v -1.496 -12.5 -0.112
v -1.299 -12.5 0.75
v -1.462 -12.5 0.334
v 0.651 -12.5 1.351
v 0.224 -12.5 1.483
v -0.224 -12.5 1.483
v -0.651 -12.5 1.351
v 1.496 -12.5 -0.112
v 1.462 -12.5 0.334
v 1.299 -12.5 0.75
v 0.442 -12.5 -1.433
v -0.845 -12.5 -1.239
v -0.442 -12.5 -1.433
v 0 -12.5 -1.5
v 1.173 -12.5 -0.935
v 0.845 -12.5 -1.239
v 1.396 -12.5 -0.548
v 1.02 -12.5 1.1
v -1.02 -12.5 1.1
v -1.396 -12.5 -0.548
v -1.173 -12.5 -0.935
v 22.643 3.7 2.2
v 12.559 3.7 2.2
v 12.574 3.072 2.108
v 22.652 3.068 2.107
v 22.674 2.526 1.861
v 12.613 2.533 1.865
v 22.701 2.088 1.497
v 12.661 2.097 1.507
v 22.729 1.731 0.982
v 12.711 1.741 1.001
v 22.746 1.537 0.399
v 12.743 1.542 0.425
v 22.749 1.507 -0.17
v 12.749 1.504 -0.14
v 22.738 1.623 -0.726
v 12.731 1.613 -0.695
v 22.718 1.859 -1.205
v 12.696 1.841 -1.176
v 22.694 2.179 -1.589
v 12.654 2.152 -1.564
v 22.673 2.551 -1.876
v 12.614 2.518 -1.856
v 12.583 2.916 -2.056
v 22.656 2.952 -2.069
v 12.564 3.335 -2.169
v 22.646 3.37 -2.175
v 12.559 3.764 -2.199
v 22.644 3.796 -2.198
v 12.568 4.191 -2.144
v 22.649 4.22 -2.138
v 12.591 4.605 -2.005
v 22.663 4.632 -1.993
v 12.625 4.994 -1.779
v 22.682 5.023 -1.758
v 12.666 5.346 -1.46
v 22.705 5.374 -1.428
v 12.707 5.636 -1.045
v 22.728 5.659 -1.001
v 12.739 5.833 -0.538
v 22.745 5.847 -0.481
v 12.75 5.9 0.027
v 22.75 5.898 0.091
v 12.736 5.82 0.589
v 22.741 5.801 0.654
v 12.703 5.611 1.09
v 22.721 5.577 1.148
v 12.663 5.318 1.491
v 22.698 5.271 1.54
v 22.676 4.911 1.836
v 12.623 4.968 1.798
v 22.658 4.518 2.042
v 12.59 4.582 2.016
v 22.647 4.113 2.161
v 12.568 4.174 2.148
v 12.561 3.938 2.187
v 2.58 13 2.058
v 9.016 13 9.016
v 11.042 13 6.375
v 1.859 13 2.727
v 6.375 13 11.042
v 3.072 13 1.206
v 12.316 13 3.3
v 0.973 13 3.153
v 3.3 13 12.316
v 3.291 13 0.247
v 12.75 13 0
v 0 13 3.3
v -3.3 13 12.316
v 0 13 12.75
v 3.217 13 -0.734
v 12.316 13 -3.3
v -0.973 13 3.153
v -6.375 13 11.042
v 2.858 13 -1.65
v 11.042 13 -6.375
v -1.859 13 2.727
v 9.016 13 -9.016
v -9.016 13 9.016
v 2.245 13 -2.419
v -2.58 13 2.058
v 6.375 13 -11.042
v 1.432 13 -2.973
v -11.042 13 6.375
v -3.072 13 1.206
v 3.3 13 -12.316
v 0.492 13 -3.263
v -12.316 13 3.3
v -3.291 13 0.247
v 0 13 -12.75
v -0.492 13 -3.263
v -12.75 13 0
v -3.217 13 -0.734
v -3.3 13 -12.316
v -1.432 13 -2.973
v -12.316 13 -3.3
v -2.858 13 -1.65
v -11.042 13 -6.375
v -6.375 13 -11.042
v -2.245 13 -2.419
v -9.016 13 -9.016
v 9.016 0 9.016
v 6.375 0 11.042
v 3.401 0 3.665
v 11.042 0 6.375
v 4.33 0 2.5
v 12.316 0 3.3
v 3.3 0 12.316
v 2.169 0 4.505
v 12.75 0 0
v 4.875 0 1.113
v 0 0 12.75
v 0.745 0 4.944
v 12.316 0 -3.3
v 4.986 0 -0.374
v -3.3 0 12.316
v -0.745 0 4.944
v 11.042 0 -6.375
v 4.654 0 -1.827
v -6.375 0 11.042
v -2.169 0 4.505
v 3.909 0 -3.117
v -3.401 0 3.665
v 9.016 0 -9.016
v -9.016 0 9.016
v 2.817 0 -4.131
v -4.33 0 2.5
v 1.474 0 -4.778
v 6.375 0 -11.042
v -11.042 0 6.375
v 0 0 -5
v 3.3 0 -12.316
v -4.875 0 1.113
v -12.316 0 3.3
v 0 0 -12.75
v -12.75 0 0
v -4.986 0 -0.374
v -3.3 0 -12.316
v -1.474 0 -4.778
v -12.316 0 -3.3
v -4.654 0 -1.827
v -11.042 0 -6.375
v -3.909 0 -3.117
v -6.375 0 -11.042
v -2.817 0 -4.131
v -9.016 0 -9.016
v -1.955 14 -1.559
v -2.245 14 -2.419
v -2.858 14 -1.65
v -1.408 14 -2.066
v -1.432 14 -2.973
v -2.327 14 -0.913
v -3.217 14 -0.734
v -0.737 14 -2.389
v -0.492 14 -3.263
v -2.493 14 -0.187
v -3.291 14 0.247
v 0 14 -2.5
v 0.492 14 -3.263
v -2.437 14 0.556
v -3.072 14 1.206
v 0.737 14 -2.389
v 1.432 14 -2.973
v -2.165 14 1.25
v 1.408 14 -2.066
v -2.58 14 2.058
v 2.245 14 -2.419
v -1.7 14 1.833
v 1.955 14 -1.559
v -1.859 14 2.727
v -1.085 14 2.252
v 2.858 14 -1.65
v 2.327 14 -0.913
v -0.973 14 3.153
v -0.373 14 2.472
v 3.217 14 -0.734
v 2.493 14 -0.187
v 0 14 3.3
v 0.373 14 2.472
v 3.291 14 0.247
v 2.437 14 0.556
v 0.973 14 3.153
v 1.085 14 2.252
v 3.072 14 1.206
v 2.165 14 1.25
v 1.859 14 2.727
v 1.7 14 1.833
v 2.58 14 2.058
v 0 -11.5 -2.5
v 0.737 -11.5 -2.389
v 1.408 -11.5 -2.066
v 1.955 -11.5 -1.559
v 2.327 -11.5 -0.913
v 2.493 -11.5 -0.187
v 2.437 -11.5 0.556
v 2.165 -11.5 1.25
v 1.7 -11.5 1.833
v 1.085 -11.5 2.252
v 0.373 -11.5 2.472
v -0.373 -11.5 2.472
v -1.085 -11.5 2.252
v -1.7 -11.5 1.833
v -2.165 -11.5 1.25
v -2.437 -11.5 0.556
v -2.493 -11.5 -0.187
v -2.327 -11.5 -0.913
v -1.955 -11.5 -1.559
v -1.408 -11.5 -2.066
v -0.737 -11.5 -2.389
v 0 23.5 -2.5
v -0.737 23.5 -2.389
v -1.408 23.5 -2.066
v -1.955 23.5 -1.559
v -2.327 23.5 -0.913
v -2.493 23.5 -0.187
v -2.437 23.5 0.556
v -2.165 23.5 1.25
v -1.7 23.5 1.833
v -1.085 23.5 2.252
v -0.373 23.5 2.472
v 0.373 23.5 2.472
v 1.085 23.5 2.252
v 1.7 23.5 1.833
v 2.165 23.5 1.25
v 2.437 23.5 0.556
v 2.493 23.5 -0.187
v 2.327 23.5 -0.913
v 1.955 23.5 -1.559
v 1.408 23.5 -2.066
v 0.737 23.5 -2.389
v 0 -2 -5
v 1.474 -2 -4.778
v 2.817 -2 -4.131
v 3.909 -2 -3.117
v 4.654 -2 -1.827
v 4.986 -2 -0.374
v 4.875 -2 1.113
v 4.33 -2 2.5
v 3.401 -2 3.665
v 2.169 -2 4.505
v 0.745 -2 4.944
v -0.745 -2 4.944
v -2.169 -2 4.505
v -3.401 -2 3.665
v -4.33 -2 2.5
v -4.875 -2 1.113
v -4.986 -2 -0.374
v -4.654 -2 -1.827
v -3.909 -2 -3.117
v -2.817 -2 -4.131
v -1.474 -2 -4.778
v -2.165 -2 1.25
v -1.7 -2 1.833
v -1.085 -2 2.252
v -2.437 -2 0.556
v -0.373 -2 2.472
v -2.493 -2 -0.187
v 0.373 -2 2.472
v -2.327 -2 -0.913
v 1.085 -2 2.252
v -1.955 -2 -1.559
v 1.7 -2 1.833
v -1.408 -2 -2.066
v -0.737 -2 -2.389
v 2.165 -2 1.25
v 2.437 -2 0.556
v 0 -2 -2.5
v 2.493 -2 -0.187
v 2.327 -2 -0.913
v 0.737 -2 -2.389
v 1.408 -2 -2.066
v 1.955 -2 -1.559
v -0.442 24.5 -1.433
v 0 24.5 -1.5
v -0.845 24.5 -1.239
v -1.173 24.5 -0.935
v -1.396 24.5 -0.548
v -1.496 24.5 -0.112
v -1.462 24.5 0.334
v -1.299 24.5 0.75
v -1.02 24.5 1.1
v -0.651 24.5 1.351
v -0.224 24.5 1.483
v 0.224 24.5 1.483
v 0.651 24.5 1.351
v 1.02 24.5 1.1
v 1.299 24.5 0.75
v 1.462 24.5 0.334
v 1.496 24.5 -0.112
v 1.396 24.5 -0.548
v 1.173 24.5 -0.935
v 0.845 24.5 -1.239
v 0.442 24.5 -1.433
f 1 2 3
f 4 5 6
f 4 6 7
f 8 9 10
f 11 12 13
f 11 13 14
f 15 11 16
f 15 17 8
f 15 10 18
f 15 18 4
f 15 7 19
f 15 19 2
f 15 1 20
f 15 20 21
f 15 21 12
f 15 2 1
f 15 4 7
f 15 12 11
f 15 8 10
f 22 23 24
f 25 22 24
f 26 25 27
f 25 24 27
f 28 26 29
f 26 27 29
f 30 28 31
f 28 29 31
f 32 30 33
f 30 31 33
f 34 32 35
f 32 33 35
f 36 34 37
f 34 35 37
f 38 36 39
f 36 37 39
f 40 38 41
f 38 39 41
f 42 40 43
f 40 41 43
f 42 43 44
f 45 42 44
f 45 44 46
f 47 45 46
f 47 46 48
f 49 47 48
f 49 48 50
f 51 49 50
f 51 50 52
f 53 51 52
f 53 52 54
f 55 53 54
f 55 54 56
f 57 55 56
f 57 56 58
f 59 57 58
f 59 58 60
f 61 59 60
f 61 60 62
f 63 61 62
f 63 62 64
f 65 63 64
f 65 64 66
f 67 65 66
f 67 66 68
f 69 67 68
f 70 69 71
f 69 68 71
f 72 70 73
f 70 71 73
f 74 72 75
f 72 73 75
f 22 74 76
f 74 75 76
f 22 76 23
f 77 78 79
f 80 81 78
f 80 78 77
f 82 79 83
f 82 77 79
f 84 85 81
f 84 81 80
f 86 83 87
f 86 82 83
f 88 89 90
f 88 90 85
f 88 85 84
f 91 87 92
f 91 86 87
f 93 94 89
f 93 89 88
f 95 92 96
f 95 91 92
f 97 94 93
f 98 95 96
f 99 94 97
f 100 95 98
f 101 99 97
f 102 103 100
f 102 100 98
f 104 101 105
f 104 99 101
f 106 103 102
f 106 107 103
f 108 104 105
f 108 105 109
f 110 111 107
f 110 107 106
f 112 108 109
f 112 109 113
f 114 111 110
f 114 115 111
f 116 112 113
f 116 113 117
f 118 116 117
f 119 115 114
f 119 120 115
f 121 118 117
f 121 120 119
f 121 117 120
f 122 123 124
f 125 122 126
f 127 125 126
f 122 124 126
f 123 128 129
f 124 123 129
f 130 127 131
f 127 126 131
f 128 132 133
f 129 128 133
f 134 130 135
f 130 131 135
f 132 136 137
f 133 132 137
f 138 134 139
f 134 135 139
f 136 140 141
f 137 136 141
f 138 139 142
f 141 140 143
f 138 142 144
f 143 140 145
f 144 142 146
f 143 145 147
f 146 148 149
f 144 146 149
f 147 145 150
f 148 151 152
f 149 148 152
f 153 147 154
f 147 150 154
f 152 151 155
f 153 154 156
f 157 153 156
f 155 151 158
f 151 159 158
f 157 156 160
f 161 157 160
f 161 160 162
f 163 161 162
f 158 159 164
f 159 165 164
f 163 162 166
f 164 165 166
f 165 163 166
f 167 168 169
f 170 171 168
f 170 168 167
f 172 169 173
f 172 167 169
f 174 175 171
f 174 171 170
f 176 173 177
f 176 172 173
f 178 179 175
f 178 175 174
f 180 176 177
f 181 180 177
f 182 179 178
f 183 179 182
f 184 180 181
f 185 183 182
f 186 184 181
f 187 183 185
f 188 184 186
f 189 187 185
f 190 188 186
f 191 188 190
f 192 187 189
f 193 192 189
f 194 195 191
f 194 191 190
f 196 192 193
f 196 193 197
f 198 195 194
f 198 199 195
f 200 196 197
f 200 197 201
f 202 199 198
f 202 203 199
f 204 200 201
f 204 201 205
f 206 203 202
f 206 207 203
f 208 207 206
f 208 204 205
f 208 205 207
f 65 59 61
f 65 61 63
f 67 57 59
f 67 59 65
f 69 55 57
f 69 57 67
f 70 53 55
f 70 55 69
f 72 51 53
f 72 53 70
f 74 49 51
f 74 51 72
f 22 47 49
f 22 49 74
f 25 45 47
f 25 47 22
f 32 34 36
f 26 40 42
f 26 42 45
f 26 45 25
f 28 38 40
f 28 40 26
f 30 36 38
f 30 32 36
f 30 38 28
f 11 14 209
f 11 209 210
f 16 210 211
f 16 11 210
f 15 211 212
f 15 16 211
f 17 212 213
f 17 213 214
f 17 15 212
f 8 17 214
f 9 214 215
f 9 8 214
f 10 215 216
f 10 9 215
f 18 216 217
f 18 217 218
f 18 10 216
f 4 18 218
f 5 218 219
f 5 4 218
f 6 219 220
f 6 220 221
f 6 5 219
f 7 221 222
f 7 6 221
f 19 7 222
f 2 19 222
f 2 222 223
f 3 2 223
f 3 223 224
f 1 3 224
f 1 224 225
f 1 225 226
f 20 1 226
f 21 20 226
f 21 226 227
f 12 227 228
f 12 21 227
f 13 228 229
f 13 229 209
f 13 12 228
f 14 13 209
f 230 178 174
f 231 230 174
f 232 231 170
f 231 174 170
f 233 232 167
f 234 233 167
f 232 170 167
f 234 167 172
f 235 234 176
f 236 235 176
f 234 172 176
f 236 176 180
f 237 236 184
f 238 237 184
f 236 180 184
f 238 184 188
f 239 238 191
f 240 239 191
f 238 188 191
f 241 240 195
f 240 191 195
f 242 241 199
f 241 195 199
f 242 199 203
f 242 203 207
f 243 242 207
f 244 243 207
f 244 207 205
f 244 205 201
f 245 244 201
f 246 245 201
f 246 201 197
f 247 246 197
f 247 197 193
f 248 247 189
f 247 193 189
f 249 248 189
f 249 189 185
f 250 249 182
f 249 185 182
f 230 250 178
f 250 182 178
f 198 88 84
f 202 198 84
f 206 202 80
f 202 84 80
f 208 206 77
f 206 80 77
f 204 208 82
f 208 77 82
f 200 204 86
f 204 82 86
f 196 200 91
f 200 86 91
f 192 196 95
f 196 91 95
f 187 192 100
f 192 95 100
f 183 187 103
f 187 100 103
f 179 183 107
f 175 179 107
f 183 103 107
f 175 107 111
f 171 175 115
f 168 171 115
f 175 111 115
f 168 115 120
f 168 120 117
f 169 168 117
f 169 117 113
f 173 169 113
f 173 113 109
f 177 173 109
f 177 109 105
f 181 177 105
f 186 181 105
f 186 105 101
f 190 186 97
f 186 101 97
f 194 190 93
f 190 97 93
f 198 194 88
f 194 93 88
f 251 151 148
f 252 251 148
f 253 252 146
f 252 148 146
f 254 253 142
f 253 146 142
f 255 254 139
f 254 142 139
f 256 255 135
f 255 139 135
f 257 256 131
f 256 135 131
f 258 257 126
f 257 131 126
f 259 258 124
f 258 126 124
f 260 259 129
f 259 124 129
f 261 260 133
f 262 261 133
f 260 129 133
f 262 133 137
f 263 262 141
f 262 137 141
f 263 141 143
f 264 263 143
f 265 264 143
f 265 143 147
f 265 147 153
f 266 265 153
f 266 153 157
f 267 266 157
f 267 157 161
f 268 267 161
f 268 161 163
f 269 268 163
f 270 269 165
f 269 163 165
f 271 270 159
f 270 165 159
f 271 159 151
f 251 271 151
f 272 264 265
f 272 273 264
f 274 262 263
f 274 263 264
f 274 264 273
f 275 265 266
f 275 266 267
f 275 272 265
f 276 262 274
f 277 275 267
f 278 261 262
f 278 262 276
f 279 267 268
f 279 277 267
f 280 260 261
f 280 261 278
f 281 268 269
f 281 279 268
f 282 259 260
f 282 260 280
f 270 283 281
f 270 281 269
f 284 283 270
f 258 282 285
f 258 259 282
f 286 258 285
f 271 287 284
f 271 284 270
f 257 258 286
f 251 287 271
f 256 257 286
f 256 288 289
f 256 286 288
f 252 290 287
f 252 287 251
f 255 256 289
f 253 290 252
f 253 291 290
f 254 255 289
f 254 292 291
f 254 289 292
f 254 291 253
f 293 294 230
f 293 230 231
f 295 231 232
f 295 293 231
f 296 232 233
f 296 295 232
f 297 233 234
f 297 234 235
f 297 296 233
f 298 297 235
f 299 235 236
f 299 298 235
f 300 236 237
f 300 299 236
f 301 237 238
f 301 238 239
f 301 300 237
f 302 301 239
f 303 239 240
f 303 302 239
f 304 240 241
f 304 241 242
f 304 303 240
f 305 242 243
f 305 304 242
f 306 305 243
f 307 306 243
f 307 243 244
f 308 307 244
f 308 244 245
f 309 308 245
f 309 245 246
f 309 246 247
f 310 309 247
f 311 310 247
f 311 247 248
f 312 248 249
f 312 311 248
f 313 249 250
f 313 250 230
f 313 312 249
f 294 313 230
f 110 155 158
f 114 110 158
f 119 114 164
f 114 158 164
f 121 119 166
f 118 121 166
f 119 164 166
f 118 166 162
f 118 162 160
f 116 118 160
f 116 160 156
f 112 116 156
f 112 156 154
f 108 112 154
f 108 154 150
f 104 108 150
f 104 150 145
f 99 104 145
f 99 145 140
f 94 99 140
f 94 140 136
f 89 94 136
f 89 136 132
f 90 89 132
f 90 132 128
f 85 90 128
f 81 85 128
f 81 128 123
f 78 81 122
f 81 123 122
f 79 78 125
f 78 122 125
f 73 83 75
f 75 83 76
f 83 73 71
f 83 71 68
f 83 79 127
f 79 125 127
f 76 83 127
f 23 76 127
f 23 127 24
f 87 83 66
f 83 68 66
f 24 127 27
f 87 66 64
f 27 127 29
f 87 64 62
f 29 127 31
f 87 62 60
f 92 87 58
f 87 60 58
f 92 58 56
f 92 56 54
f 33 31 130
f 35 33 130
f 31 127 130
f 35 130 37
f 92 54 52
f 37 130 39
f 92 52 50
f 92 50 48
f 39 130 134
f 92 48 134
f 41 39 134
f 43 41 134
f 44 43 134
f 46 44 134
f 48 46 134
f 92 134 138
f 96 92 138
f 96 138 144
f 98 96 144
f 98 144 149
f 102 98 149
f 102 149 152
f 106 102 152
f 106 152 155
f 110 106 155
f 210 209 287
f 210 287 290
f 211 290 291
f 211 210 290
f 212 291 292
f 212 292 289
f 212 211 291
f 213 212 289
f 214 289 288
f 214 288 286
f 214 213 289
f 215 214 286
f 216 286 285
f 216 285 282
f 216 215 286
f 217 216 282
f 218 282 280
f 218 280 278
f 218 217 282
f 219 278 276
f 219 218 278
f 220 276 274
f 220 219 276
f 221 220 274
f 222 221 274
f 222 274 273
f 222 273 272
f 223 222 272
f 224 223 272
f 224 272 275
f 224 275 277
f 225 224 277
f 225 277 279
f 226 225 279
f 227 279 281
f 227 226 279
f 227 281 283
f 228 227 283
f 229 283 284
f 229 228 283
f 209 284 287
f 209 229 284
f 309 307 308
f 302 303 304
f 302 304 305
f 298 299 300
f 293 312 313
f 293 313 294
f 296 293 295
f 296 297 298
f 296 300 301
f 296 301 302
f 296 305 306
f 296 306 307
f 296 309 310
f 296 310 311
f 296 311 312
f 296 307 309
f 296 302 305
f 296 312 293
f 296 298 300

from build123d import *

# Parameters (mm, degrees)
SKETCH1_R                = 12.75
BOSS_EXTRUDE1_DEPTH      = 13
SKETCH2_R                = 3.3
BOSS_EXTRUDE2_DEPTH      = 1
SKETCH3_R                = 2.5
BOSS_EXTRUDE3_DEPTH      = 10.5
SKETCH4_R                = 5
BOSS_EXTRUDE4_DEPTH      = 2
BOSS_EXTRUDE5_START      = 10.5
SKETCH5_R                = 2.5
BOSS_EXTRUDE5_DEPTH      = 10.5
CHAMFER1_SIZE            = 1
BOSS_EXTRUDE6_REACH      = 32.42
BOSS_EXTRUDE6_END_RADIUS = 22.75
SKETCH6_R                = 2.2


with BuildPart() as part:
    # Sketch1 → Boss-Extrude1 (new body)
    with BuildSketch(Plane(origin=(0, 0, 0), x_dir=(1, 0, 0), z_dir=(0, 1, 0))):
        with Locations(Location((0, 0, 0), (0, 0, 90))):
            Circle(SKETCH1_R)
    extrude(amount=BOSS_EXTRUDE1_DEPTH)

    # Sketch2 → Boss-Extrude2 (add)
    with BuildSketch(Plane(origin=(0, 13, 0), x_dir=(1, 0, 0), z_dir=(0, 1, 0))):
        with Locations(Location((0, 0, 0), (0, 0, 270))):
            Circle(SKETCH2_R)
    extrude(amount=BOSS_EXTRUDE2_DEPTH)

    # Sketch3 → Boss-Extrude3 (add)
    with BuildSketch(Plane(origin=(0, 14, 0), x_dir=(1, 0, 0), z_dir=(0, 1, 0))):
        with Locations(Location((0, 0, 0), (0, 0, 90))):
            Circle(SKETCH3_R)
    extrude(amount=BOSS_EXTRUDE3_DEPTH)

    # Sketch4 → Boss-Extrude4 (add)
    with BuildSketch(Plane.XZ):
        with Locations(Location((0, 0, 0), (0, 0, 270))):
            Circle(SKETCH4_R)
    extrude(amount=BOSS_EXTRUDE4_DEPTH)

    # Sketch5 → Boss-Extrude5 (add)
    with BuildSketch(Plane.XZ.offset(2).offset(BOSS_EXTRUDE5_START)):
        with Locations(Location((0, 0, 0), (0, 0, 270))):
            Circle(SKETCH5_R)
    extrude(amount=-BOSS_EXTRUDE5_DEPTH)

    # Chamfer1
    chamfer1_edges = [part.edges().sort_by_distance(p)[0] for p in [
        (0, 24.5, 2.5),
        (0, -12.5, 2.5),
    ]]
    chamfer(chamfer1_edges, length=CHAMFER1_SIZE)

    # Boss-Extrude6: up to this cylinder (the profile starts inside it)
    boss_extrude6_end = Plane(origin=(0, 3.7, 0), z_dir=(0, -1, 0)) * Cylinder(BOSS_EXTRUDE6_END_RADIUS, 111.34, mode=Mode.PRIVATE)
    # Sketch6 → Boss-Extrude6 (add, up to the surface)
    with BuildSketch(Plane(origin=(0, 0, 0), x_dir=(0, 0, -1), z_dir=(1, 0, 0)), mode=Mode.PRIVATE) as boss_extrude6_sk1:
        with Locations(Location((0, 3.7, 0), (0, 0, 180))):
            Circle(SKETCH6_R)
    boss_extrude6_tool1 = extrude(boss_extrude6_sk1.sketch, amount=BOSS_EXTRUDE6_REACH, mode=Mode.PRIVATE) & boss_extrude6_end
    add(boss_extrude6_tool1.solids().sort_by_distance((0, 3.7, 0))[0])


solid = part.part
